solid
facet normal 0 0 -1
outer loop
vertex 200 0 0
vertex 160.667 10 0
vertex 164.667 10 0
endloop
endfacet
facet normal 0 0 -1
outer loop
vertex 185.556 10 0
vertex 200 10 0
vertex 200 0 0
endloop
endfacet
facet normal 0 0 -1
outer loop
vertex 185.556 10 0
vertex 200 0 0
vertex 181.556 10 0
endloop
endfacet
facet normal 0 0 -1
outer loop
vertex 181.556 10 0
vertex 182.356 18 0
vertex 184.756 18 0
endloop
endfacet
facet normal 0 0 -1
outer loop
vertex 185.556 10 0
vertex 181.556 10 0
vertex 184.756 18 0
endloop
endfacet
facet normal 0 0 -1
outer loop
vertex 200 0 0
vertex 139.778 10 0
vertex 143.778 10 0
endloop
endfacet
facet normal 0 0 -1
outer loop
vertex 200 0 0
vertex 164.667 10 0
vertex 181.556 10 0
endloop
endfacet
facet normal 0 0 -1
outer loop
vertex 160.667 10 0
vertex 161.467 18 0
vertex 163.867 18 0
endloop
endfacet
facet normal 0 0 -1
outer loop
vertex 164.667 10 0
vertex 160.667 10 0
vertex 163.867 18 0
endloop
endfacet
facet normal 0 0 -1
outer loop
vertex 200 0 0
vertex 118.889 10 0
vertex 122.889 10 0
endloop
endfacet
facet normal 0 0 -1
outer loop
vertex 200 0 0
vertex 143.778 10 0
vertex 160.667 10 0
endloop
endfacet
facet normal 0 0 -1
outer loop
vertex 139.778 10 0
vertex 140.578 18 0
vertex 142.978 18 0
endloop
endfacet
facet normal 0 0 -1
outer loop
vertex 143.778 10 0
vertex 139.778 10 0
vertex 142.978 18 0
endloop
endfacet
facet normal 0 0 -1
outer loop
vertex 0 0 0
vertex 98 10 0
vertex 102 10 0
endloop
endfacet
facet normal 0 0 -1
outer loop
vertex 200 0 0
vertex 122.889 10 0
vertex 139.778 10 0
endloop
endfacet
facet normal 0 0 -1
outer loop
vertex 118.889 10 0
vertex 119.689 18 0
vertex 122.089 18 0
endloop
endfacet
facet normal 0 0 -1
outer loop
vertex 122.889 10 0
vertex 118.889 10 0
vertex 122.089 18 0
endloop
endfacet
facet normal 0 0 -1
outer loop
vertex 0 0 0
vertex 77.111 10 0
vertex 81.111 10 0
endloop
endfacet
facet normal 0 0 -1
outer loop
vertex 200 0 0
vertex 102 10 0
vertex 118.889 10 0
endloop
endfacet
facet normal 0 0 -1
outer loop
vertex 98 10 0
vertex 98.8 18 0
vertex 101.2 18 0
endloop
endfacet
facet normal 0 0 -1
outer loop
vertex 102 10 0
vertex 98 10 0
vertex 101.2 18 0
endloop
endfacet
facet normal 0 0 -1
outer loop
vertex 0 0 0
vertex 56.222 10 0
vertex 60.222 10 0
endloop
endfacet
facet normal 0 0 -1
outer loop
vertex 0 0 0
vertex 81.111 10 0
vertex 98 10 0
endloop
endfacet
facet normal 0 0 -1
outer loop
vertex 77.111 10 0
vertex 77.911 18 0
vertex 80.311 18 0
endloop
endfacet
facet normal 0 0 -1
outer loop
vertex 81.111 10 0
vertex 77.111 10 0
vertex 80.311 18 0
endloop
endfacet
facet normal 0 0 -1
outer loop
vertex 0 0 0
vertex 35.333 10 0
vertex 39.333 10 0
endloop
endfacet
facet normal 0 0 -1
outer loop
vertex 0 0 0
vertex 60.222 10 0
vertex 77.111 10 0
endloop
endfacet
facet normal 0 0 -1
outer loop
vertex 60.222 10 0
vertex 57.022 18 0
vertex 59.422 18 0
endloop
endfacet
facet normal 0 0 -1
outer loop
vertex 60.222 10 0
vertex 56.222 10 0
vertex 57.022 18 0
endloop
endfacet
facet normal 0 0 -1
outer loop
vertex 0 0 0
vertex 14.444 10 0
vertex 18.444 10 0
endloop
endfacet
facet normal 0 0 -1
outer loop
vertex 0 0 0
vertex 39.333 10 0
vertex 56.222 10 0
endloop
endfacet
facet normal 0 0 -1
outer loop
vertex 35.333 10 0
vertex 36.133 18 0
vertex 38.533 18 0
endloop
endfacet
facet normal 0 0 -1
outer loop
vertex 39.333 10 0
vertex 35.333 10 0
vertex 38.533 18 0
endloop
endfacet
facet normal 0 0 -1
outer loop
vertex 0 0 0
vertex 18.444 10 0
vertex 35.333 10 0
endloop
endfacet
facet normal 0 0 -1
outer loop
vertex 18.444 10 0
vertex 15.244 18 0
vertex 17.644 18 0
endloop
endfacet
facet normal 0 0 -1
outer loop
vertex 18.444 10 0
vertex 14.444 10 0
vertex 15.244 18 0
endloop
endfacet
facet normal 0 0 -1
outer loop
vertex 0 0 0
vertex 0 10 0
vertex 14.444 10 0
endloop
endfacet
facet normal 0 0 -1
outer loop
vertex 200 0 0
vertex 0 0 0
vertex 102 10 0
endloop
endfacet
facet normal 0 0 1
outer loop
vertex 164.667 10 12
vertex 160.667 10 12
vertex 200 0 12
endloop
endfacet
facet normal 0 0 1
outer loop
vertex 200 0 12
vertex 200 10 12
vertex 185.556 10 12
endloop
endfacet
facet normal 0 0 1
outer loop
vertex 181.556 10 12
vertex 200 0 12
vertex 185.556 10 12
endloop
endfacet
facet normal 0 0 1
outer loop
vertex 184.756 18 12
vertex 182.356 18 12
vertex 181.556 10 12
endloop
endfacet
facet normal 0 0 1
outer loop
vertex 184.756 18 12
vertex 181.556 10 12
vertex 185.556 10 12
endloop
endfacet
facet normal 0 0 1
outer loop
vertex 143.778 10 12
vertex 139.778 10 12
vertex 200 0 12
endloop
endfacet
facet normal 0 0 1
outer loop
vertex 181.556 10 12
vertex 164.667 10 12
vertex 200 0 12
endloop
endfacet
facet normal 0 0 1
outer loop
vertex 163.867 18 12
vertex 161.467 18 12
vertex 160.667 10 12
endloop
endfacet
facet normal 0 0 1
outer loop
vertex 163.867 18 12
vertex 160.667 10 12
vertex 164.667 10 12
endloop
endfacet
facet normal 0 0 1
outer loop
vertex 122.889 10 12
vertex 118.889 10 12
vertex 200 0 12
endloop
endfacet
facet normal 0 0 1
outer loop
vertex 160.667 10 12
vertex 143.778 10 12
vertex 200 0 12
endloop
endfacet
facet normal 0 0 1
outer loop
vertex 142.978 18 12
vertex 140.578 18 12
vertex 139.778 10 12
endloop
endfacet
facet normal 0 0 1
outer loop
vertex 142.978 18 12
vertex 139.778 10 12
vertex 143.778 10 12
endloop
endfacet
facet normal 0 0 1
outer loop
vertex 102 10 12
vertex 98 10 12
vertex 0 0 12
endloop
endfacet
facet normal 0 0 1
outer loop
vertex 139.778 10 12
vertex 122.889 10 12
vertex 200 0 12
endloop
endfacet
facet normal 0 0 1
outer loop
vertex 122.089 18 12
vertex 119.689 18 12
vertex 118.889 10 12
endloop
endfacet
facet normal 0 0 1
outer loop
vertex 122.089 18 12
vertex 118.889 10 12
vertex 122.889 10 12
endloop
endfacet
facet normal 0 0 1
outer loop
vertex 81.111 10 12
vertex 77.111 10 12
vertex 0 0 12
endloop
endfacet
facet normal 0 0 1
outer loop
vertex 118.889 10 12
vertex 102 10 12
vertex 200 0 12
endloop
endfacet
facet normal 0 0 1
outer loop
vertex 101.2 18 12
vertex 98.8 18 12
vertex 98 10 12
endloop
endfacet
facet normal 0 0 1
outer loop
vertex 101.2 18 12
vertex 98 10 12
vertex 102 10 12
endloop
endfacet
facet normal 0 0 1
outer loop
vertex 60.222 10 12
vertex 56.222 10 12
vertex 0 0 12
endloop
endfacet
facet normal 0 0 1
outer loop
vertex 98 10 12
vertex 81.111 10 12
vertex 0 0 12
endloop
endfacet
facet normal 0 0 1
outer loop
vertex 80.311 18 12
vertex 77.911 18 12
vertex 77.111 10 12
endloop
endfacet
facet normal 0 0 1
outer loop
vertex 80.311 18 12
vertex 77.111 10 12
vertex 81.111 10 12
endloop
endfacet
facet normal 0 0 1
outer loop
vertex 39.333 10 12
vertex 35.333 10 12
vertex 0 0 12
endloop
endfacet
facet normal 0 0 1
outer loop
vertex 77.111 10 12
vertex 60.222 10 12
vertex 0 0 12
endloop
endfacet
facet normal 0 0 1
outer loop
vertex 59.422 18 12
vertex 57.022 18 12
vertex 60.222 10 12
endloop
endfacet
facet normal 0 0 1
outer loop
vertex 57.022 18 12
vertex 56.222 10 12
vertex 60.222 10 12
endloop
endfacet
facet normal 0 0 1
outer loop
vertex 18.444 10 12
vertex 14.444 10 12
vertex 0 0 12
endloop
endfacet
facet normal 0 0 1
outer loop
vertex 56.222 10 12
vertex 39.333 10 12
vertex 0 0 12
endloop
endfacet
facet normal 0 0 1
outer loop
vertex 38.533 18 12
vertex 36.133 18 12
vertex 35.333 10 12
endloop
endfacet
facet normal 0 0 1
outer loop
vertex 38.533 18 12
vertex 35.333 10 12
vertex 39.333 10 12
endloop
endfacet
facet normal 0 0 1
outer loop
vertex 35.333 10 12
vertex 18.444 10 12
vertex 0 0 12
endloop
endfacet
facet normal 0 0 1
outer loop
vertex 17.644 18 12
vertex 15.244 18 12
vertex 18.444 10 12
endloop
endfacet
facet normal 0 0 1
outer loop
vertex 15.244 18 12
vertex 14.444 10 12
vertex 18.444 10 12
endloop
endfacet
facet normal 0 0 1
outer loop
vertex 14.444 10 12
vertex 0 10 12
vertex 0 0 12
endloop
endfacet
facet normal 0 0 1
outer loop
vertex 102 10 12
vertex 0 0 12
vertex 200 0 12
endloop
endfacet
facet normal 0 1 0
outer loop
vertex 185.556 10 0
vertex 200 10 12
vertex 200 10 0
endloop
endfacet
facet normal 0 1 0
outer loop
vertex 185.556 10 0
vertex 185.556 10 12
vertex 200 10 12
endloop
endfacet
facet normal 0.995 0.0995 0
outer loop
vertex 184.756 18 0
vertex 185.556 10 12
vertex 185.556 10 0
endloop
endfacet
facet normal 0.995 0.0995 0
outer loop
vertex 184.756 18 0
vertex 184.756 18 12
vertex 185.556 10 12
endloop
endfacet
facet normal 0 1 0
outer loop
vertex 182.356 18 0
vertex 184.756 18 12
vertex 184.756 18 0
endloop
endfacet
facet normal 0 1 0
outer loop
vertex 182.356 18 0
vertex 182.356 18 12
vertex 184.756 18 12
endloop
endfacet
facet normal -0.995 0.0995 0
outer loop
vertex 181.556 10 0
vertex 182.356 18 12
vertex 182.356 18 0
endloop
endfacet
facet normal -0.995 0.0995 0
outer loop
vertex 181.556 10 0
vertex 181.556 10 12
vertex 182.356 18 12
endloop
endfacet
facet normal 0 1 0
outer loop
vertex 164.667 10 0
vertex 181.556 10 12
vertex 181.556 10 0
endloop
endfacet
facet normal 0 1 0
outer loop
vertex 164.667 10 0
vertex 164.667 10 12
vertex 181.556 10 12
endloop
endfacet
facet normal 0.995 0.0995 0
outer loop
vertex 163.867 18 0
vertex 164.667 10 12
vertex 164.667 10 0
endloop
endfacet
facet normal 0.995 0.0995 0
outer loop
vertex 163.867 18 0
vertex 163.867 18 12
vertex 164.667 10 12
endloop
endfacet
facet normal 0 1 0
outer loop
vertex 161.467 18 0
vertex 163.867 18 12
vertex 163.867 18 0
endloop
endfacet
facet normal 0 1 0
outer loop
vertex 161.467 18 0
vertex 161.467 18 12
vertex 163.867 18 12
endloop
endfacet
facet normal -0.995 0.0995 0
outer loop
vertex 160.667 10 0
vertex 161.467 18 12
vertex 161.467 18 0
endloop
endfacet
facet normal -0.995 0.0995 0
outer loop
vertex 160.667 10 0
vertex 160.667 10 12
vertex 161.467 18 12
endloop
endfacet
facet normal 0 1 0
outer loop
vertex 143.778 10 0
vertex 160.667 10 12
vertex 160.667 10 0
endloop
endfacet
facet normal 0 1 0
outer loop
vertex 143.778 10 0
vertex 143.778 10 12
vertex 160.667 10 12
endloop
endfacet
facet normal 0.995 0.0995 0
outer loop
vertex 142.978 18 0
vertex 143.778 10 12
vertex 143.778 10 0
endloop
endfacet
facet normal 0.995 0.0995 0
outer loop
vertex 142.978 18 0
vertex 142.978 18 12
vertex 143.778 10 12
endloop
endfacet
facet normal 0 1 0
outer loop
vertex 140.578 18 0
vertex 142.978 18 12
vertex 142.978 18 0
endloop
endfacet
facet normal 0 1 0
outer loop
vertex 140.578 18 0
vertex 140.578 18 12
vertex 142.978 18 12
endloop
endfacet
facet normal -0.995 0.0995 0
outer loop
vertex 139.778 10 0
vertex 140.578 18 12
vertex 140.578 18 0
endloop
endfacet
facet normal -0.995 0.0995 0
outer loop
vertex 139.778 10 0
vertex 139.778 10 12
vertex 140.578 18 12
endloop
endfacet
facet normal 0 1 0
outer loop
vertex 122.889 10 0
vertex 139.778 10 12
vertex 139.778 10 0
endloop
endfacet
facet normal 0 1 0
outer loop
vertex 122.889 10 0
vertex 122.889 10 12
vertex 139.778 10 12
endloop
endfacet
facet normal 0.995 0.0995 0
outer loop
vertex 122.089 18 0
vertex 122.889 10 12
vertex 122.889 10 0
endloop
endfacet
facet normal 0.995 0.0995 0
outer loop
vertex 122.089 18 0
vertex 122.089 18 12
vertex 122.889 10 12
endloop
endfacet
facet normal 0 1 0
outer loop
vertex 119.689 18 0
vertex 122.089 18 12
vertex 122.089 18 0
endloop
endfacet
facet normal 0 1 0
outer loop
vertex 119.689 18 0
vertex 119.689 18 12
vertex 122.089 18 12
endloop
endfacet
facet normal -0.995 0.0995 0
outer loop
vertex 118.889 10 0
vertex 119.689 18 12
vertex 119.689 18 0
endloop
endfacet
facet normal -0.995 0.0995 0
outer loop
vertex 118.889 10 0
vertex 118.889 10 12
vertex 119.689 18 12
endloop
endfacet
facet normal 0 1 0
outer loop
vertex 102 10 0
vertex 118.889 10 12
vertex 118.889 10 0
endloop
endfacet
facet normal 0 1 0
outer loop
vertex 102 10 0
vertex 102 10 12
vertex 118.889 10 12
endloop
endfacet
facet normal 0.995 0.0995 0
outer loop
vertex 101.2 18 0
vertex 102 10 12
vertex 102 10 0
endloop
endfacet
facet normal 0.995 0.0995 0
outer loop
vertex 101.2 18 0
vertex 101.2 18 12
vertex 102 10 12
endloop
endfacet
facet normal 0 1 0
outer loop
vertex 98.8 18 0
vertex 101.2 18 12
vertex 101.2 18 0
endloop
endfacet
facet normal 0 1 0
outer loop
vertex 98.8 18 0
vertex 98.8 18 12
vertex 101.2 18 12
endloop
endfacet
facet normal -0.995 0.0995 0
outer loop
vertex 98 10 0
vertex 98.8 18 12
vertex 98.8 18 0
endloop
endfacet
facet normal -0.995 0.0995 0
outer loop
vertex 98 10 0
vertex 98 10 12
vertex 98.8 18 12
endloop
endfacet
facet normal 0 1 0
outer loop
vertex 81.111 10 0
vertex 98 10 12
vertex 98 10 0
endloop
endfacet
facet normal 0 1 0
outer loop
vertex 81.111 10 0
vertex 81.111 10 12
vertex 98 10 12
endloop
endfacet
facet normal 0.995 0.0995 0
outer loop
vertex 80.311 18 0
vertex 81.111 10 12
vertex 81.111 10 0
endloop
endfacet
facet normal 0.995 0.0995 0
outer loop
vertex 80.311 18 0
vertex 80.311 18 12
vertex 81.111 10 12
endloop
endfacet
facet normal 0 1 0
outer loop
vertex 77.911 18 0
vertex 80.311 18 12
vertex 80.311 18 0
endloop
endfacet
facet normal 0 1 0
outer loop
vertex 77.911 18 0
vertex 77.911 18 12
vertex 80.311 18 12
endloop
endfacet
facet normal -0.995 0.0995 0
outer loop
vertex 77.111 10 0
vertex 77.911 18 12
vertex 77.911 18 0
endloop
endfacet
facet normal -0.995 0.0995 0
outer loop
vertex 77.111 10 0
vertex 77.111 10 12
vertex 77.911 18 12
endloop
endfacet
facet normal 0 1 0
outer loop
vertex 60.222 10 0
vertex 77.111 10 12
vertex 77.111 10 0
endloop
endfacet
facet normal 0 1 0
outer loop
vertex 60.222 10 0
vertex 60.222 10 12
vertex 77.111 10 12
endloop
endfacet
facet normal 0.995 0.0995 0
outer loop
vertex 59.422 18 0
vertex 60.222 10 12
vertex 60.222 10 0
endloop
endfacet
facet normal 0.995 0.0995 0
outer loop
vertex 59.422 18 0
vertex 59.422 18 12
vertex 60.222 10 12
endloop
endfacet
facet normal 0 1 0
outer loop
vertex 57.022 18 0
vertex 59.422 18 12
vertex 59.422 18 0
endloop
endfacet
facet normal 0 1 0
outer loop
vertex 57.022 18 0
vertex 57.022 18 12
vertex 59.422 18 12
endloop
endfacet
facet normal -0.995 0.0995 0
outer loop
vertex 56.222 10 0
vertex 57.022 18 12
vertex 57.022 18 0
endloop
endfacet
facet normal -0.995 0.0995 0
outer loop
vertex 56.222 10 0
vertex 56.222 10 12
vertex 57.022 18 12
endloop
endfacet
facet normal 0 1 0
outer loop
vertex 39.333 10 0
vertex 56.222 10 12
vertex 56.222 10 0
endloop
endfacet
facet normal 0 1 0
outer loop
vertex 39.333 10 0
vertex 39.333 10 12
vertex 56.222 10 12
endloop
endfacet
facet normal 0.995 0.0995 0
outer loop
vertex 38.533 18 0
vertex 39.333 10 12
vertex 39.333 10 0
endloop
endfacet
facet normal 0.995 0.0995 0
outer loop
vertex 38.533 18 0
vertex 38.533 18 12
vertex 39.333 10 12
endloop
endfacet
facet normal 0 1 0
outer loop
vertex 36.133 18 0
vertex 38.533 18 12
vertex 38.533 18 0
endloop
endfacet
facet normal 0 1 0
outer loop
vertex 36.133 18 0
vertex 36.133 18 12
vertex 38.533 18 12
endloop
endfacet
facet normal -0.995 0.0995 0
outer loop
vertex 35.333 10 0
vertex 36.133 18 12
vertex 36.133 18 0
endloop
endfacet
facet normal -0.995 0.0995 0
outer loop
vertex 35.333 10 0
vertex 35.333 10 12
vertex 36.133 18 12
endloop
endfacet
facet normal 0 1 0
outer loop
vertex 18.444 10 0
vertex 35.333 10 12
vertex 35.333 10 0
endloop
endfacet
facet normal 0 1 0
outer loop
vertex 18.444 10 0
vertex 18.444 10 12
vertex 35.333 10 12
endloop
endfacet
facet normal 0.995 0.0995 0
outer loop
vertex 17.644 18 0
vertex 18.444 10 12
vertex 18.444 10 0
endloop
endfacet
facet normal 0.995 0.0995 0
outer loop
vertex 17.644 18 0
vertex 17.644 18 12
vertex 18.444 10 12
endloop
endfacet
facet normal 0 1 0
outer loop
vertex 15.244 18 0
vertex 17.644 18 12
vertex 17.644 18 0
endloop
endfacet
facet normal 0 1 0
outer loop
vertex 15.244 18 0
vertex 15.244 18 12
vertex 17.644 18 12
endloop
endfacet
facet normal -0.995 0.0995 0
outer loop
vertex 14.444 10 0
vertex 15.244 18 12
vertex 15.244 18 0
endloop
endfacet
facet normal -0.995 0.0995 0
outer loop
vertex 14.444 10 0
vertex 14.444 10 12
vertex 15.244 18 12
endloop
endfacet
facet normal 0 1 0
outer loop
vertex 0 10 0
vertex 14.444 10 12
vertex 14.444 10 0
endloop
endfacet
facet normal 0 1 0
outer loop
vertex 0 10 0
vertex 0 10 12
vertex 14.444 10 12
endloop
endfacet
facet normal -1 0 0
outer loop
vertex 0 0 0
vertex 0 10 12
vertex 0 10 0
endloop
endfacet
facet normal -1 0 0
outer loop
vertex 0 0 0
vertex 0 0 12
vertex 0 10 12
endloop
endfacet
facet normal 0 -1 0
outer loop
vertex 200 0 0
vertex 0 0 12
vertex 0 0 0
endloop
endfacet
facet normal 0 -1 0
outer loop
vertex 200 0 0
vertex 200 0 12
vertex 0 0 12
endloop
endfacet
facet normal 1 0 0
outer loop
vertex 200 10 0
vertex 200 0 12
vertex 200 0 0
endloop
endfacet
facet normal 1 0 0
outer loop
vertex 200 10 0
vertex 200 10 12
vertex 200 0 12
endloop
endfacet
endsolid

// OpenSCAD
$fn = 32;

// ----------------------------------------------------------------------
// Gear rack: 9 teeth on a 200 mm bar, pitch 20.89 mm
// ----------------------------------------------------------------------

// --- parameters (mm) ---
profile_height = 12;      // extrusion height
profile_points = 40;      // points of the closed outline

profile = [[0, 0], [200, 0], [200, 10], [185.556, 10], [184.756, 18], [182.356, 18], [181.556, 10], [164.667, 10], [163.867, 18], [161.467, 18], [160.667, 10], [143.778, 10], [142.978, 18], [140.578, 18], [139.778, 10], [122.889, 10], [122.089, 18], [119.689, 18], [118.889, 10], [102, 10], [101.2, 18], [98.8, 18], [98, 10], [81.111, 10], [80.311, 18], [77.911, 18], [77.111, 10], [60.222, 10], [59.422, 18], [57.022, 18], [56.222, 10], [39.333, 10], [38.533, 18], [36.133, 18], [35.333, 10], [18.444, 10], [17.644, 18], [15.244, 18], [14.444, 10], [0, 10]];  // single closed polygon, 40 points, counter clockwise

// --- the one profile operation ---
linear_extrude(height = profile_height) polygon(points = profile);
